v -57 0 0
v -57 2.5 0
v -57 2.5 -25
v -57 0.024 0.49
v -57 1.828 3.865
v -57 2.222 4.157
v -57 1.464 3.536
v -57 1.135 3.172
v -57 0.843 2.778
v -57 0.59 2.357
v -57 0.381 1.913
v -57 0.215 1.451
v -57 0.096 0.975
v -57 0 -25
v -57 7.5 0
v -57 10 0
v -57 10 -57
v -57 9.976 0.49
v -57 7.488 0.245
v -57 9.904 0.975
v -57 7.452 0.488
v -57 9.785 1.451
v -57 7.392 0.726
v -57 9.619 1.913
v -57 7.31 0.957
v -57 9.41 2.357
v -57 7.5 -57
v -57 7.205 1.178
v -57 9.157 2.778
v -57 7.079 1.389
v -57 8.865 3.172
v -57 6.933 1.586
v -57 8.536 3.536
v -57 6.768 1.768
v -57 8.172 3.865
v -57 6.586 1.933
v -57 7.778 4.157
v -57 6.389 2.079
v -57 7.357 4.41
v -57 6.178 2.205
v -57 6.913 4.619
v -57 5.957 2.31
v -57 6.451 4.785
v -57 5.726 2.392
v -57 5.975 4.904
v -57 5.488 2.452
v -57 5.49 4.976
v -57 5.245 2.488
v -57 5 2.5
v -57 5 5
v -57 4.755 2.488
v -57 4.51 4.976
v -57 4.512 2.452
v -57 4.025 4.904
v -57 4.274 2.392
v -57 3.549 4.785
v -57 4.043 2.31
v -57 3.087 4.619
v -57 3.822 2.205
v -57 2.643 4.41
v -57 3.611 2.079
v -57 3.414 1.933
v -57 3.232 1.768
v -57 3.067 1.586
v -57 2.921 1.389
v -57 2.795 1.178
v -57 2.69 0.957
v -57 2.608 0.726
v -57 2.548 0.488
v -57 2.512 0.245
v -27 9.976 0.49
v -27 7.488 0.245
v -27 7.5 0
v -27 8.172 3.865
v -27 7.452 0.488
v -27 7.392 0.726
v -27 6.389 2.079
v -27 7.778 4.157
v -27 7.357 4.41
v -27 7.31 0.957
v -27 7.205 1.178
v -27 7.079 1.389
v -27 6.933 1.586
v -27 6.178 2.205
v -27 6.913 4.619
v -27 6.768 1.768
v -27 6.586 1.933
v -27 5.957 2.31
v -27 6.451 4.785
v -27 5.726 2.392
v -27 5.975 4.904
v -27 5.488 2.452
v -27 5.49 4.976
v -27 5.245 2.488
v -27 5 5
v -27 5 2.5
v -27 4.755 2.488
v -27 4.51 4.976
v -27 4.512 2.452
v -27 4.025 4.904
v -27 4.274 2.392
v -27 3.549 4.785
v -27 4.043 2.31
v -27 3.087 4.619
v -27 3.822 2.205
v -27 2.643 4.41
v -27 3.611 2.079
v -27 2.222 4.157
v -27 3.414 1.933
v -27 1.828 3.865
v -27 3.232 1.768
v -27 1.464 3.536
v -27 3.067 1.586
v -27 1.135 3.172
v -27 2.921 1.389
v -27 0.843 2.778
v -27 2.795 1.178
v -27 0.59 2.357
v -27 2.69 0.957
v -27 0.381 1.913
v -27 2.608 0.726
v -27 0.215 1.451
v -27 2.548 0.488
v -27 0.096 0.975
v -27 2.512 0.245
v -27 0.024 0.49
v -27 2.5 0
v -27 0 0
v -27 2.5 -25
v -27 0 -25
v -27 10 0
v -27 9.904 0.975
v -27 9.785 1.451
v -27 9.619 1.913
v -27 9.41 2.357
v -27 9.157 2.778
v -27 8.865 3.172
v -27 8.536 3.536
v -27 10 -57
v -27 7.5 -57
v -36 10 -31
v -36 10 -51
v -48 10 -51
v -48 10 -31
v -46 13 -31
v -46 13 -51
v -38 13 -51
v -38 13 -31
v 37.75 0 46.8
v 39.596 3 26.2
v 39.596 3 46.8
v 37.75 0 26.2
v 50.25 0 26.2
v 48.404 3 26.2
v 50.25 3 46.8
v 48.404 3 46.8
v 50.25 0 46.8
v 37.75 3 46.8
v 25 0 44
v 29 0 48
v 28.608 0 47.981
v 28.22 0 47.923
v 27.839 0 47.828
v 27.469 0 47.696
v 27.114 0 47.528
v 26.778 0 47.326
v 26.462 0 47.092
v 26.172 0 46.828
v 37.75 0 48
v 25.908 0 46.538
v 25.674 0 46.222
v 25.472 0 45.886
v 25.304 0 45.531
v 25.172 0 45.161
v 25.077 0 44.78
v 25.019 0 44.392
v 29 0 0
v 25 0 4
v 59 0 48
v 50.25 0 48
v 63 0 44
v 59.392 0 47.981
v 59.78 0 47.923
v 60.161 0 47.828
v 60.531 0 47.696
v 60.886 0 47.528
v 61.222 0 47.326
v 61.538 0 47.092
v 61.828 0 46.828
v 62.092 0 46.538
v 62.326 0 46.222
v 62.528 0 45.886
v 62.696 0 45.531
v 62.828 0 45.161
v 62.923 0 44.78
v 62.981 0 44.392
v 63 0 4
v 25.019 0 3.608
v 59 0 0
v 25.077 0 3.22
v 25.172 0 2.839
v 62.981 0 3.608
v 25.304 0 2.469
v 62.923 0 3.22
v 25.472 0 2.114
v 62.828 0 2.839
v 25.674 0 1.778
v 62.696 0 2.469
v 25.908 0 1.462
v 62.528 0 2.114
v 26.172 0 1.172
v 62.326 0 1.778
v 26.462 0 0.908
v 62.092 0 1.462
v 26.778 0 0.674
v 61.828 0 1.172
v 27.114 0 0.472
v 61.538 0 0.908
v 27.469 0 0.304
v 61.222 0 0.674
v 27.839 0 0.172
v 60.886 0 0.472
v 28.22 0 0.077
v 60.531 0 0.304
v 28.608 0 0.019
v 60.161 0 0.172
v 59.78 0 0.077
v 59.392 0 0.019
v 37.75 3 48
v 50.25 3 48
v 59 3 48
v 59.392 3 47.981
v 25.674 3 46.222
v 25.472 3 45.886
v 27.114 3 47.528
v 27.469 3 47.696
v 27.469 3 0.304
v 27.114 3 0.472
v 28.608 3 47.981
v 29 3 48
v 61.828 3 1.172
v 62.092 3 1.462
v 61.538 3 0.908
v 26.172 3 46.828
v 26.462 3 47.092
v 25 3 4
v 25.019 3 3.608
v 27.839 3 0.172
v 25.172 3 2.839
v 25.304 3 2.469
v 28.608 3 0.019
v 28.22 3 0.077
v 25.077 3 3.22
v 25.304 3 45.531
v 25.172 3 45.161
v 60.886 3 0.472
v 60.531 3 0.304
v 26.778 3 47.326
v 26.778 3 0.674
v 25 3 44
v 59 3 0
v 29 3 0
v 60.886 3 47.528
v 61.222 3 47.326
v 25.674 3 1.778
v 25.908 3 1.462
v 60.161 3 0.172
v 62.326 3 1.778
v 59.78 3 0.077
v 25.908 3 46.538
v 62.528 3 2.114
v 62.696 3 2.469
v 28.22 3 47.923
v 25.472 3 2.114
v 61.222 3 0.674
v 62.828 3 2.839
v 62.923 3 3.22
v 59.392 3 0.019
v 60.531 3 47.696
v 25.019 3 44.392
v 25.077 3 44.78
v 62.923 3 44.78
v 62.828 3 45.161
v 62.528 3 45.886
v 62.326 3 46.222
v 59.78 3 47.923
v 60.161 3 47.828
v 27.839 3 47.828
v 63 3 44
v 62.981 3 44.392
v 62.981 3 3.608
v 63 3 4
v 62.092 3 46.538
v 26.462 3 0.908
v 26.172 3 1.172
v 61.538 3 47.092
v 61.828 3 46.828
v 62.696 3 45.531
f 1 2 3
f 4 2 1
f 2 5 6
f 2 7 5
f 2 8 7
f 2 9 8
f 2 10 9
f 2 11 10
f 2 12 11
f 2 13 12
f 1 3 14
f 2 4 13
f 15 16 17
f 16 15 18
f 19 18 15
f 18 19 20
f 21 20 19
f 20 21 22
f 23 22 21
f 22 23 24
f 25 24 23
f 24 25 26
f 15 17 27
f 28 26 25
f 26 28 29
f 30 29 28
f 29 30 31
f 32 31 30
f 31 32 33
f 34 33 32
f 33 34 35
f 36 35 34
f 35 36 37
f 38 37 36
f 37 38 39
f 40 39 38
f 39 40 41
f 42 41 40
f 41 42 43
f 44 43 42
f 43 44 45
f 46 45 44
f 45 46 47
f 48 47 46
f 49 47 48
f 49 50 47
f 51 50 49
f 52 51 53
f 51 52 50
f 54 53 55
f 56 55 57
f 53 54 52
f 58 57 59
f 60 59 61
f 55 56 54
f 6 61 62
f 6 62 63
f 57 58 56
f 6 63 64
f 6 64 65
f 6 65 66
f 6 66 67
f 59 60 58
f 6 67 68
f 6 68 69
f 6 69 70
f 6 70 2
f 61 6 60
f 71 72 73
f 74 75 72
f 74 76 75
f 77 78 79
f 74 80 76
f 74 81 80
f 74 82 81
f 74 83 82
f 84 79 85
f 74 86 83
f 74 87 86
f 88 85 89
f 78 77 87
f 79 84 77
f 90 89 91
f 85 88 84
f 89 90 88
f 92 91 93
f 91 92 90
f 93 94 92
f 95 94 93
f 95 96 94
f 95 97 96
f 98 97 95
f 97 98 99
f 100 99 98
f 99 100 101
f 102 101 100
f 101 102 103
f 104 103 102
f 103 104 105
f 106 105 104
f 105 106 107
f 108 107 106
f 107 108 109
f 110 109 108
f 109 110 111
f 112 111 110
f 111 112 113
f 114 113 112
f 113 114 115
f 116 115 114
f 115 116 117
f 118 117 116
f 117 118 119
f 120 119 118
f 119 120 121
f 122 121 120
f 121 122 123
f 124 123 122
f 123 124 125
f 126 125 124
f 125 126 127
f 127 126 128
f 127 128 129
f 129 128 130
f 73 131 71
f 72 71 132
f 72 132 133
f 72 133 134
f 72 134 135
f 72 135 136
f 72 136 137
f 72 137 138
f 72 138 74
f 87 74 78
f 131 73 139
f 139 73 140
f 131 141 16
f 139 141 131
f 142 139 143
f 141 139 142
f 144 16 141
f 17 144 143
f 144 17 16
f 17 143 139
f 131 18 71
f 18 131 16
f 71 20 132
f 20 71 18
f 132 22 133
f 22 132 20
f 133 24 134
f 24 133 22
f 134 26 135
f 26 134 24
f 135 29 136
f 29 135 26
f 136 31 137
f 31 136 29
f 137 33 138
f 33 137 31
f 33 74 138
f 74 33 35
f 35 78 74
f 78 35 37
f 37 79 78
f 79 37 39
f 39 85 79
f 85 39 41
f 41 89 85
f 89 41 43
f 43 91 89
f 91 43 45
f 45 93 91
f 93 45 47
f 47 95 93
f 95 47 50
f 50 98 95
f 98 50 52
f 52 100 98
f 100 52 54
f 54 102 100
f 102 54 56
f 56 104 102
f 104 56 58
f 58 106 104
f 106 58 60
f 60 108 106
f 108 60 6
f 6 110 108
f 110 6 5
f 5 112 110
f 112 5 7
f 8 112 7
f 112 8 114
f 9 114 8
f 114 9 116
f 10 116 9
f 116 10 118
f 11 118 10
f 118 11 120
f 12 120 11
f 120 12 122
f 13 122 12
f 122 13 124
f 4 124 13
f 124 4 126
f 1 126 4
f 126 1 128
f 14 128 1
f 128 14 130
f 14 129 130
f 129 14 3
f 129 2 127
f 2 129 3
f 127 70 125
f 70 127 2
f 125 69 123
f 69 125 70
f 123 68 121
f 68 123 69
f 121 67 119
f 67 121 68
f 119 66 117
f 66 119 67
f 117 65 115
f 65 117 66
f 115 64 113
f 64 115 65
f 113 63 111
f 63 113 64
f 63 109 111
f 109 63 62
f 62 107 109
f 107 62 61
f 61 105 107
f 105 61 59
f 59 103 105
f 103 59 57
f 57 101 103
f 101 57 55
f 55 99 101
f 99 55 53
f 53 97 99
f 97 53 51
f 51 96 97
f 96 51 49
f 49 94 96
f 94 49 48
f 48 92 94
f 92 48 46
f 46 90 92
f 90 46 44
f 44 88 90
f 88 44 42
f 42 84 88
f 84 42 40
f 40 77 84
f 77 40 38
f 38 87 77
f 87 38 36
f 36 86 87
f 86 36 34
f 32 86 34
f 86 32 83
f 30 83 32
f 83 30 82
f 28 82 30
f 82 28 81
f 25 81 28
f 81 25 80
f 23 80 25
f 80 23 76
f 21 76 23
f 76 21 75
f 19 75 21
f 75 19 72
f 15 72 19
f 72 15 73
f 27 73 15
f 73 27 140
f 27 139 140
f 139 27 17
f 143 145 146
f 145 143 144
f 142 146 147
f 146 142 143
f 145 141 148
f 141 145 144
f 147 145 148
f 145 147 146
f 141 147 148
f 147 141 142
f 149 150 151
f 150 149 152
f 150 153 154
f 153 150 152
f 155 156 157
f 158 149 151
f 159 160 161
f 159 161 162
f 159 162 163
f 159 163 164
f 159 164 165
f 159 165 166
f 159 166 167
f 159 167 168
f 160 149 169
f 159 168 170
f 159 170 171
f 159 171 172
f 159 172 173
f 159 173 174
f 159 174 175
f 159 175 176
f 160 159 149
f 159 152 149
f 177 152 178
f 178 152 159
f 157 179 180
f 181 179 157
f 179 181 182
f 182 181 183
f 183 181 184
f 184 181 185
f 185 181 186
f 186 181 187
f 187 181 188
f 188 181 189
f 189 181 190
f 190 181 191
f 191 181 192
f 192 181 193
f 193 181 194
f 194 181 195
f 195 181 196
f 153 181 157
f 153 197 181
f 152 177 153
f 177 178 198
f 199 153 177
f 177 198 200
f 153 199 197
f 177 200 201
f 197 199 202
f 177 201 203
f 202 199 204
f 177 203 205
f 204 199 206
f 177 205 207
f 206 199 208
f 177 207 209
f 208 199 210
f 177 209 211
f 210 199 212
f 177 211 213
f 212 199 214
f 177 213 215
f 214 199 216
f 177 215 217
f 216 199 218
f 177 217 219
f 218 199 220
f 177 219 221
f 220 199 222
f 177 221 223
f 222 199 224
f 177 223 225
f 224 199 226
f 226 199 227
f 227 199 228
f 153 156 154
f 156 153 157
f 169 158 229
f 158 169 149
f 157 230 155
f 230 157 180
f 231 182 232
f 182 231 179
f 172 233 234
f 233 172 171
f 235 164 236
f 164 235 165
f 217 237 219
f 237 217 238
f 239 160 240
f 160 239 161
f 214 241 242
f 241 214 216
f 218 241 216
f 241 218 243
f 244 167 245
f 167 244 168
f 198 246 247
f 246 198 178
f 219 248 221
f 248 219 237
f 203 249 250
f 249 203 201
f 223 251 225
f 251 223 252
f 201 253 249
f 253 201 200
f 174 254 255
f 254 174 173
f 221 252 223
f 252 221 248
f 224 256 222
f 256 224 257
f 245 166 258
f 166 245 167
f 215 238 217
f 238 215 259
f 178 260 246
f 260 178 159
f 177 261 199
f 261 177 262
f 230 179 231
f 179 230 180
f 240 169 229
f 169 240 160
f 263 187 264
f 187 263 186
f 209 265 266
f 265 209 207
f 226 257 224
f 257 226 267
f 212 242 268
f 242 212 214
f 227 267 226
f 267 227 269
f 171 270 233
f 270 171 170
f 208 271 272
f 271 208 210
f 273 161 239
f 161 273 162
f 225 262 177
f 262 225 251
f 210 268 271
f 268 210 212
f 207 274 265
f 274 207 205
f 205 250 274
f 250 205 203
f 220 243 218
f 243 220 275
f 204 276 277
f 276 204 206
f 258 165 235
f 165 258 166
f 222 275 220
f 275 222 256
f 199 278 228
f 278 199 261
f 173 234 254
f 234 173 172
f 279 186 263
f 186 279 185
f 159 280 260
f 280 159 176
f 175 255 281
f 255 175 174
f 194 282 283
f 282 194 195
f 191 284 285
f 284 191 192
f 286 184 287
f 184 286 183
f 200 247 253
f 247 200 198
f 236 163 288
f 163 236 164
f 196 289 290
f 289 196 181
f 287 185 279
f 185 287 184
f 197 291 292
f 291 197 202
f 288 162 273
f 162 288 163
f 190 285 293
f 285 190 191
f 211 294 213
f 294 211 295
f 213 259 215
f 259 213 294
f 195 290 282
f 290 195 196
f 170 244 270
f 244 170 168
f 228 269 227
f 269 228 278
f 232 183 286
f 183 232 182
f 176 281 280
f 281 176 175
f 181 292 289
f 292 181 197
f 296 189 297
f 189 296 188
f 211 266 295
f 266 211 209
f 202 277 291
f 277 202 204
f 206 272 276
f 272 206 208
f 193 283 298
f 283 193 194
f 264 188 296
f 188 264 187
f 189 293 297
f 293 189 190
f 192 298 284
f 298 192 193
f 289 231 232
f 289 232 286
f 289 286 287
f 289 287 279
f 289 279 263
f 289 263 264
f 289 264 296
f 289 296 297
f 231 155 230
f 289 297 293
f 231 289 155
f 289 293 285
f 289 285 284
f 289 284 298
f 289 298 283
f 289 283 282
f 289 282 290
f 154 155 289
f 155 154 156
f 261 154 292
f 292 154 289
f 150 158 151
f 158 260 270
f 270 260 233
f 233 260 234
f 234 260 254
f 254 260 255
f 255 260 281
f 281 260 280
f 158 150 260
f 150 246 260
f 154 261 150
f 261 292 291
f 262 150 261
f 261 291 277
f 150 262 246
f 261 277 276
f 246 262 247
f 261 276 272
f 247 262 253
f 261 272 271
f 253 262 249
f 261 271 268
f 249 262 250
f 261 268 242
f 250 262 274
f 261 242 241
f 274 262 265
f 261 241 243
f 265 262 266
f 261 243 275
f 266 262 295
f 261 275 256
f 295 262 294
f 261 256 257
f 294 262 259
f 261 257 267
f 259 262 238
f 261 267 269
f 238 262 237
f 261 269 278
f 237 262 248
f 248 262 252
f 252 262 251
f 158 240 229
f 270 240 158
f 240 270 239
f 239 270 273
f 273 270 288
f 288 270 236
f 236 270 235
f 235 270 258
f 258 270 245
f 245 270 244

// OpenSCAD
// modular-clip-remote-holder — slim back plate (male dovetail) with a
// short cup at the bottom that catches the lower edge of a remote. The
// remote rests in the cup and leans against the plate, with its whole
// upper body free. Defaults sized for a 34 × 7.5 mm remote.
// Author: John Mylchreest <jmylchreest@gmail.com>. MIT licensed.

use <../../libraries/modular-clip/modular-clip.scad>

/* [Output] */
// `all` arranges the clip and the holder side-by-side on the X axis so
// the slicer can pick each up for separate plates.
render_target = "all";  // [clip, holder, all]

/* [Clip — grips the edge] */
clip_grip_d     = 5;
clip_grip_h     = 25;
clip_width      = 30;
clip_wall_t     = 2.5;
clip_top_r      = 2.0;
clip_arm_extend = 32;   // ≥ CLIP_DOVETAIL_L + 2 mm so the slot fits

/* [Holder — slim back plate carrying the male connector] */
// The plate is just a slim "spine" — wide enough for the cup at the
// bottom + the dovetail rail behind. Total height covers the rail at
// the top + the cup at the bottom.
plate_w     = 38;   // X width (slightly wider than the cup outer width)
plate_h     = 48;   // Z height — top region carries the rail, bottom region carries the cup
plate_t     = 3.0;  // Y thickness behind the rail (default library minimum)
plate_r     = 4;    // plate outer corner radius (cosmetic)

/* [Cup — small cradle at the bottom that catches the remote] */
remote_w        = 34.0;
remote_d        = 7.5;
cup_clear_w     = 0.6;  // total X clearance for the remote in the cup
cup_clear_d     = 0.4;  // total Y clearance for the remote
cup_side_t      = 2.0;  // X thickness of each cup side wall
cup_front_t     = 2.0;  // Y thickness of the cup front wall
cup_floor_t     = 2.5;  // floor thickness (solid bottom)
cup_h           = 12;   // total cup height (floor + walls)
cup_corner_r    = 3.0;  // rounding on the cup's outer corners

/* [Quality] */
$fa = $preview ? $fa : 1;
$fs = $preview ? $fs : 0.2;
$fn = 64;

/* [Layout — `render_target = all` only] */
all_spacing = 25;

// ---- derived ----
cup_inner_w = remote_w + cup_clear_w;             // X interior of the cup
cup_inner_d = remote_d + cup_clear_d;             // Y interior of the cup
cup_outer_w = cup_inner_w + 2 * cup_side_t;       // X exterior
cup_outer_d = cup_inner_d + cup_front_t;          // Y exterior (back is shared with plate)

// ---- modules ----

// 2D rounded rectangle with the back-left corner at (0,0), front in +Y.
module _rrect2d_corner(w, d, r) {
    rr = min(r, min(w, d) / 2 - 0.001);
    offset(r = rr) offset(r = -rr)
        translate([rr, rr]) square([w - 2 * rr, d - 2 * rr]);
}

// Small cup at the bottom of the plate. Outer footprint X width =
// cup_outer_w, Y depth = cup_outer_d (back face shared with the plate's
// +Y face at Y=0). Interior cavity (X = cup_inner_w, Y = cup_inner_d)
// is open at the top; the back of the cavity is the plate itself.
module cup() {
    difference() {
        // Outer cup body — extruded from a 2D rounded rectangle sitting
        // on the +Y face of the plate (Y=0 to Y=cup_outer_d, X centred).
        translate([-cup_outer_w / 2, 0, 0])
            linear_extrude(height = cup_h)
                _rrect2d_corner(cup_outer_w, cup_outer_d, cup_corner_r);

        // Interior cavity for the remote — open at the top, back at Y=0
        // (against the plate's front face).
        translate([-cup_inner_w / 2, -0.01, cup_floor_t])
            cube([cup_inner_w, cup_inner_d + 0.01, cup_h - cup_floor_t + 1]);
    }
}

// Full holder = slim back plate (male rail on its back) + cup at the bottom.
module remote_holder() {
    union() {
        modular_holder_back(width    = plate_w,
                            height   = plate_h,
                            wall_t   = plate_t,
                            corner_r = plate_r);
        cup();
    }
}

// ---- output ----
if (render_target == "clip") {
    clip(grip_d = clip_grip_d, grip_h = clip_grip_h, width = clip_width,
         wall_t = clip_wall_t, top_r = clip_top_r,
         arm_extend = clip_arm_extend);
} else if (render_target == "holder") {
    remote_holder();
} else if (render_target == "all") {
    // Clip rotated 90° so its width is along X for compact layout.
    translate([-all_spacing - clip_width / 2 - 2, 0, 0])
        rotate([0, 0, 90])
            clip(grip_d = clip_grip_d, grip_h = clip_grip_h,
                 width = clip_width, wall_t = clip_wall_t,
                 top_r = clip_top_r, arm_extend = clip_arm_extend);
    translate([all_spacing + plate_w / 2, 0, 0])
        remote_holder();
}
